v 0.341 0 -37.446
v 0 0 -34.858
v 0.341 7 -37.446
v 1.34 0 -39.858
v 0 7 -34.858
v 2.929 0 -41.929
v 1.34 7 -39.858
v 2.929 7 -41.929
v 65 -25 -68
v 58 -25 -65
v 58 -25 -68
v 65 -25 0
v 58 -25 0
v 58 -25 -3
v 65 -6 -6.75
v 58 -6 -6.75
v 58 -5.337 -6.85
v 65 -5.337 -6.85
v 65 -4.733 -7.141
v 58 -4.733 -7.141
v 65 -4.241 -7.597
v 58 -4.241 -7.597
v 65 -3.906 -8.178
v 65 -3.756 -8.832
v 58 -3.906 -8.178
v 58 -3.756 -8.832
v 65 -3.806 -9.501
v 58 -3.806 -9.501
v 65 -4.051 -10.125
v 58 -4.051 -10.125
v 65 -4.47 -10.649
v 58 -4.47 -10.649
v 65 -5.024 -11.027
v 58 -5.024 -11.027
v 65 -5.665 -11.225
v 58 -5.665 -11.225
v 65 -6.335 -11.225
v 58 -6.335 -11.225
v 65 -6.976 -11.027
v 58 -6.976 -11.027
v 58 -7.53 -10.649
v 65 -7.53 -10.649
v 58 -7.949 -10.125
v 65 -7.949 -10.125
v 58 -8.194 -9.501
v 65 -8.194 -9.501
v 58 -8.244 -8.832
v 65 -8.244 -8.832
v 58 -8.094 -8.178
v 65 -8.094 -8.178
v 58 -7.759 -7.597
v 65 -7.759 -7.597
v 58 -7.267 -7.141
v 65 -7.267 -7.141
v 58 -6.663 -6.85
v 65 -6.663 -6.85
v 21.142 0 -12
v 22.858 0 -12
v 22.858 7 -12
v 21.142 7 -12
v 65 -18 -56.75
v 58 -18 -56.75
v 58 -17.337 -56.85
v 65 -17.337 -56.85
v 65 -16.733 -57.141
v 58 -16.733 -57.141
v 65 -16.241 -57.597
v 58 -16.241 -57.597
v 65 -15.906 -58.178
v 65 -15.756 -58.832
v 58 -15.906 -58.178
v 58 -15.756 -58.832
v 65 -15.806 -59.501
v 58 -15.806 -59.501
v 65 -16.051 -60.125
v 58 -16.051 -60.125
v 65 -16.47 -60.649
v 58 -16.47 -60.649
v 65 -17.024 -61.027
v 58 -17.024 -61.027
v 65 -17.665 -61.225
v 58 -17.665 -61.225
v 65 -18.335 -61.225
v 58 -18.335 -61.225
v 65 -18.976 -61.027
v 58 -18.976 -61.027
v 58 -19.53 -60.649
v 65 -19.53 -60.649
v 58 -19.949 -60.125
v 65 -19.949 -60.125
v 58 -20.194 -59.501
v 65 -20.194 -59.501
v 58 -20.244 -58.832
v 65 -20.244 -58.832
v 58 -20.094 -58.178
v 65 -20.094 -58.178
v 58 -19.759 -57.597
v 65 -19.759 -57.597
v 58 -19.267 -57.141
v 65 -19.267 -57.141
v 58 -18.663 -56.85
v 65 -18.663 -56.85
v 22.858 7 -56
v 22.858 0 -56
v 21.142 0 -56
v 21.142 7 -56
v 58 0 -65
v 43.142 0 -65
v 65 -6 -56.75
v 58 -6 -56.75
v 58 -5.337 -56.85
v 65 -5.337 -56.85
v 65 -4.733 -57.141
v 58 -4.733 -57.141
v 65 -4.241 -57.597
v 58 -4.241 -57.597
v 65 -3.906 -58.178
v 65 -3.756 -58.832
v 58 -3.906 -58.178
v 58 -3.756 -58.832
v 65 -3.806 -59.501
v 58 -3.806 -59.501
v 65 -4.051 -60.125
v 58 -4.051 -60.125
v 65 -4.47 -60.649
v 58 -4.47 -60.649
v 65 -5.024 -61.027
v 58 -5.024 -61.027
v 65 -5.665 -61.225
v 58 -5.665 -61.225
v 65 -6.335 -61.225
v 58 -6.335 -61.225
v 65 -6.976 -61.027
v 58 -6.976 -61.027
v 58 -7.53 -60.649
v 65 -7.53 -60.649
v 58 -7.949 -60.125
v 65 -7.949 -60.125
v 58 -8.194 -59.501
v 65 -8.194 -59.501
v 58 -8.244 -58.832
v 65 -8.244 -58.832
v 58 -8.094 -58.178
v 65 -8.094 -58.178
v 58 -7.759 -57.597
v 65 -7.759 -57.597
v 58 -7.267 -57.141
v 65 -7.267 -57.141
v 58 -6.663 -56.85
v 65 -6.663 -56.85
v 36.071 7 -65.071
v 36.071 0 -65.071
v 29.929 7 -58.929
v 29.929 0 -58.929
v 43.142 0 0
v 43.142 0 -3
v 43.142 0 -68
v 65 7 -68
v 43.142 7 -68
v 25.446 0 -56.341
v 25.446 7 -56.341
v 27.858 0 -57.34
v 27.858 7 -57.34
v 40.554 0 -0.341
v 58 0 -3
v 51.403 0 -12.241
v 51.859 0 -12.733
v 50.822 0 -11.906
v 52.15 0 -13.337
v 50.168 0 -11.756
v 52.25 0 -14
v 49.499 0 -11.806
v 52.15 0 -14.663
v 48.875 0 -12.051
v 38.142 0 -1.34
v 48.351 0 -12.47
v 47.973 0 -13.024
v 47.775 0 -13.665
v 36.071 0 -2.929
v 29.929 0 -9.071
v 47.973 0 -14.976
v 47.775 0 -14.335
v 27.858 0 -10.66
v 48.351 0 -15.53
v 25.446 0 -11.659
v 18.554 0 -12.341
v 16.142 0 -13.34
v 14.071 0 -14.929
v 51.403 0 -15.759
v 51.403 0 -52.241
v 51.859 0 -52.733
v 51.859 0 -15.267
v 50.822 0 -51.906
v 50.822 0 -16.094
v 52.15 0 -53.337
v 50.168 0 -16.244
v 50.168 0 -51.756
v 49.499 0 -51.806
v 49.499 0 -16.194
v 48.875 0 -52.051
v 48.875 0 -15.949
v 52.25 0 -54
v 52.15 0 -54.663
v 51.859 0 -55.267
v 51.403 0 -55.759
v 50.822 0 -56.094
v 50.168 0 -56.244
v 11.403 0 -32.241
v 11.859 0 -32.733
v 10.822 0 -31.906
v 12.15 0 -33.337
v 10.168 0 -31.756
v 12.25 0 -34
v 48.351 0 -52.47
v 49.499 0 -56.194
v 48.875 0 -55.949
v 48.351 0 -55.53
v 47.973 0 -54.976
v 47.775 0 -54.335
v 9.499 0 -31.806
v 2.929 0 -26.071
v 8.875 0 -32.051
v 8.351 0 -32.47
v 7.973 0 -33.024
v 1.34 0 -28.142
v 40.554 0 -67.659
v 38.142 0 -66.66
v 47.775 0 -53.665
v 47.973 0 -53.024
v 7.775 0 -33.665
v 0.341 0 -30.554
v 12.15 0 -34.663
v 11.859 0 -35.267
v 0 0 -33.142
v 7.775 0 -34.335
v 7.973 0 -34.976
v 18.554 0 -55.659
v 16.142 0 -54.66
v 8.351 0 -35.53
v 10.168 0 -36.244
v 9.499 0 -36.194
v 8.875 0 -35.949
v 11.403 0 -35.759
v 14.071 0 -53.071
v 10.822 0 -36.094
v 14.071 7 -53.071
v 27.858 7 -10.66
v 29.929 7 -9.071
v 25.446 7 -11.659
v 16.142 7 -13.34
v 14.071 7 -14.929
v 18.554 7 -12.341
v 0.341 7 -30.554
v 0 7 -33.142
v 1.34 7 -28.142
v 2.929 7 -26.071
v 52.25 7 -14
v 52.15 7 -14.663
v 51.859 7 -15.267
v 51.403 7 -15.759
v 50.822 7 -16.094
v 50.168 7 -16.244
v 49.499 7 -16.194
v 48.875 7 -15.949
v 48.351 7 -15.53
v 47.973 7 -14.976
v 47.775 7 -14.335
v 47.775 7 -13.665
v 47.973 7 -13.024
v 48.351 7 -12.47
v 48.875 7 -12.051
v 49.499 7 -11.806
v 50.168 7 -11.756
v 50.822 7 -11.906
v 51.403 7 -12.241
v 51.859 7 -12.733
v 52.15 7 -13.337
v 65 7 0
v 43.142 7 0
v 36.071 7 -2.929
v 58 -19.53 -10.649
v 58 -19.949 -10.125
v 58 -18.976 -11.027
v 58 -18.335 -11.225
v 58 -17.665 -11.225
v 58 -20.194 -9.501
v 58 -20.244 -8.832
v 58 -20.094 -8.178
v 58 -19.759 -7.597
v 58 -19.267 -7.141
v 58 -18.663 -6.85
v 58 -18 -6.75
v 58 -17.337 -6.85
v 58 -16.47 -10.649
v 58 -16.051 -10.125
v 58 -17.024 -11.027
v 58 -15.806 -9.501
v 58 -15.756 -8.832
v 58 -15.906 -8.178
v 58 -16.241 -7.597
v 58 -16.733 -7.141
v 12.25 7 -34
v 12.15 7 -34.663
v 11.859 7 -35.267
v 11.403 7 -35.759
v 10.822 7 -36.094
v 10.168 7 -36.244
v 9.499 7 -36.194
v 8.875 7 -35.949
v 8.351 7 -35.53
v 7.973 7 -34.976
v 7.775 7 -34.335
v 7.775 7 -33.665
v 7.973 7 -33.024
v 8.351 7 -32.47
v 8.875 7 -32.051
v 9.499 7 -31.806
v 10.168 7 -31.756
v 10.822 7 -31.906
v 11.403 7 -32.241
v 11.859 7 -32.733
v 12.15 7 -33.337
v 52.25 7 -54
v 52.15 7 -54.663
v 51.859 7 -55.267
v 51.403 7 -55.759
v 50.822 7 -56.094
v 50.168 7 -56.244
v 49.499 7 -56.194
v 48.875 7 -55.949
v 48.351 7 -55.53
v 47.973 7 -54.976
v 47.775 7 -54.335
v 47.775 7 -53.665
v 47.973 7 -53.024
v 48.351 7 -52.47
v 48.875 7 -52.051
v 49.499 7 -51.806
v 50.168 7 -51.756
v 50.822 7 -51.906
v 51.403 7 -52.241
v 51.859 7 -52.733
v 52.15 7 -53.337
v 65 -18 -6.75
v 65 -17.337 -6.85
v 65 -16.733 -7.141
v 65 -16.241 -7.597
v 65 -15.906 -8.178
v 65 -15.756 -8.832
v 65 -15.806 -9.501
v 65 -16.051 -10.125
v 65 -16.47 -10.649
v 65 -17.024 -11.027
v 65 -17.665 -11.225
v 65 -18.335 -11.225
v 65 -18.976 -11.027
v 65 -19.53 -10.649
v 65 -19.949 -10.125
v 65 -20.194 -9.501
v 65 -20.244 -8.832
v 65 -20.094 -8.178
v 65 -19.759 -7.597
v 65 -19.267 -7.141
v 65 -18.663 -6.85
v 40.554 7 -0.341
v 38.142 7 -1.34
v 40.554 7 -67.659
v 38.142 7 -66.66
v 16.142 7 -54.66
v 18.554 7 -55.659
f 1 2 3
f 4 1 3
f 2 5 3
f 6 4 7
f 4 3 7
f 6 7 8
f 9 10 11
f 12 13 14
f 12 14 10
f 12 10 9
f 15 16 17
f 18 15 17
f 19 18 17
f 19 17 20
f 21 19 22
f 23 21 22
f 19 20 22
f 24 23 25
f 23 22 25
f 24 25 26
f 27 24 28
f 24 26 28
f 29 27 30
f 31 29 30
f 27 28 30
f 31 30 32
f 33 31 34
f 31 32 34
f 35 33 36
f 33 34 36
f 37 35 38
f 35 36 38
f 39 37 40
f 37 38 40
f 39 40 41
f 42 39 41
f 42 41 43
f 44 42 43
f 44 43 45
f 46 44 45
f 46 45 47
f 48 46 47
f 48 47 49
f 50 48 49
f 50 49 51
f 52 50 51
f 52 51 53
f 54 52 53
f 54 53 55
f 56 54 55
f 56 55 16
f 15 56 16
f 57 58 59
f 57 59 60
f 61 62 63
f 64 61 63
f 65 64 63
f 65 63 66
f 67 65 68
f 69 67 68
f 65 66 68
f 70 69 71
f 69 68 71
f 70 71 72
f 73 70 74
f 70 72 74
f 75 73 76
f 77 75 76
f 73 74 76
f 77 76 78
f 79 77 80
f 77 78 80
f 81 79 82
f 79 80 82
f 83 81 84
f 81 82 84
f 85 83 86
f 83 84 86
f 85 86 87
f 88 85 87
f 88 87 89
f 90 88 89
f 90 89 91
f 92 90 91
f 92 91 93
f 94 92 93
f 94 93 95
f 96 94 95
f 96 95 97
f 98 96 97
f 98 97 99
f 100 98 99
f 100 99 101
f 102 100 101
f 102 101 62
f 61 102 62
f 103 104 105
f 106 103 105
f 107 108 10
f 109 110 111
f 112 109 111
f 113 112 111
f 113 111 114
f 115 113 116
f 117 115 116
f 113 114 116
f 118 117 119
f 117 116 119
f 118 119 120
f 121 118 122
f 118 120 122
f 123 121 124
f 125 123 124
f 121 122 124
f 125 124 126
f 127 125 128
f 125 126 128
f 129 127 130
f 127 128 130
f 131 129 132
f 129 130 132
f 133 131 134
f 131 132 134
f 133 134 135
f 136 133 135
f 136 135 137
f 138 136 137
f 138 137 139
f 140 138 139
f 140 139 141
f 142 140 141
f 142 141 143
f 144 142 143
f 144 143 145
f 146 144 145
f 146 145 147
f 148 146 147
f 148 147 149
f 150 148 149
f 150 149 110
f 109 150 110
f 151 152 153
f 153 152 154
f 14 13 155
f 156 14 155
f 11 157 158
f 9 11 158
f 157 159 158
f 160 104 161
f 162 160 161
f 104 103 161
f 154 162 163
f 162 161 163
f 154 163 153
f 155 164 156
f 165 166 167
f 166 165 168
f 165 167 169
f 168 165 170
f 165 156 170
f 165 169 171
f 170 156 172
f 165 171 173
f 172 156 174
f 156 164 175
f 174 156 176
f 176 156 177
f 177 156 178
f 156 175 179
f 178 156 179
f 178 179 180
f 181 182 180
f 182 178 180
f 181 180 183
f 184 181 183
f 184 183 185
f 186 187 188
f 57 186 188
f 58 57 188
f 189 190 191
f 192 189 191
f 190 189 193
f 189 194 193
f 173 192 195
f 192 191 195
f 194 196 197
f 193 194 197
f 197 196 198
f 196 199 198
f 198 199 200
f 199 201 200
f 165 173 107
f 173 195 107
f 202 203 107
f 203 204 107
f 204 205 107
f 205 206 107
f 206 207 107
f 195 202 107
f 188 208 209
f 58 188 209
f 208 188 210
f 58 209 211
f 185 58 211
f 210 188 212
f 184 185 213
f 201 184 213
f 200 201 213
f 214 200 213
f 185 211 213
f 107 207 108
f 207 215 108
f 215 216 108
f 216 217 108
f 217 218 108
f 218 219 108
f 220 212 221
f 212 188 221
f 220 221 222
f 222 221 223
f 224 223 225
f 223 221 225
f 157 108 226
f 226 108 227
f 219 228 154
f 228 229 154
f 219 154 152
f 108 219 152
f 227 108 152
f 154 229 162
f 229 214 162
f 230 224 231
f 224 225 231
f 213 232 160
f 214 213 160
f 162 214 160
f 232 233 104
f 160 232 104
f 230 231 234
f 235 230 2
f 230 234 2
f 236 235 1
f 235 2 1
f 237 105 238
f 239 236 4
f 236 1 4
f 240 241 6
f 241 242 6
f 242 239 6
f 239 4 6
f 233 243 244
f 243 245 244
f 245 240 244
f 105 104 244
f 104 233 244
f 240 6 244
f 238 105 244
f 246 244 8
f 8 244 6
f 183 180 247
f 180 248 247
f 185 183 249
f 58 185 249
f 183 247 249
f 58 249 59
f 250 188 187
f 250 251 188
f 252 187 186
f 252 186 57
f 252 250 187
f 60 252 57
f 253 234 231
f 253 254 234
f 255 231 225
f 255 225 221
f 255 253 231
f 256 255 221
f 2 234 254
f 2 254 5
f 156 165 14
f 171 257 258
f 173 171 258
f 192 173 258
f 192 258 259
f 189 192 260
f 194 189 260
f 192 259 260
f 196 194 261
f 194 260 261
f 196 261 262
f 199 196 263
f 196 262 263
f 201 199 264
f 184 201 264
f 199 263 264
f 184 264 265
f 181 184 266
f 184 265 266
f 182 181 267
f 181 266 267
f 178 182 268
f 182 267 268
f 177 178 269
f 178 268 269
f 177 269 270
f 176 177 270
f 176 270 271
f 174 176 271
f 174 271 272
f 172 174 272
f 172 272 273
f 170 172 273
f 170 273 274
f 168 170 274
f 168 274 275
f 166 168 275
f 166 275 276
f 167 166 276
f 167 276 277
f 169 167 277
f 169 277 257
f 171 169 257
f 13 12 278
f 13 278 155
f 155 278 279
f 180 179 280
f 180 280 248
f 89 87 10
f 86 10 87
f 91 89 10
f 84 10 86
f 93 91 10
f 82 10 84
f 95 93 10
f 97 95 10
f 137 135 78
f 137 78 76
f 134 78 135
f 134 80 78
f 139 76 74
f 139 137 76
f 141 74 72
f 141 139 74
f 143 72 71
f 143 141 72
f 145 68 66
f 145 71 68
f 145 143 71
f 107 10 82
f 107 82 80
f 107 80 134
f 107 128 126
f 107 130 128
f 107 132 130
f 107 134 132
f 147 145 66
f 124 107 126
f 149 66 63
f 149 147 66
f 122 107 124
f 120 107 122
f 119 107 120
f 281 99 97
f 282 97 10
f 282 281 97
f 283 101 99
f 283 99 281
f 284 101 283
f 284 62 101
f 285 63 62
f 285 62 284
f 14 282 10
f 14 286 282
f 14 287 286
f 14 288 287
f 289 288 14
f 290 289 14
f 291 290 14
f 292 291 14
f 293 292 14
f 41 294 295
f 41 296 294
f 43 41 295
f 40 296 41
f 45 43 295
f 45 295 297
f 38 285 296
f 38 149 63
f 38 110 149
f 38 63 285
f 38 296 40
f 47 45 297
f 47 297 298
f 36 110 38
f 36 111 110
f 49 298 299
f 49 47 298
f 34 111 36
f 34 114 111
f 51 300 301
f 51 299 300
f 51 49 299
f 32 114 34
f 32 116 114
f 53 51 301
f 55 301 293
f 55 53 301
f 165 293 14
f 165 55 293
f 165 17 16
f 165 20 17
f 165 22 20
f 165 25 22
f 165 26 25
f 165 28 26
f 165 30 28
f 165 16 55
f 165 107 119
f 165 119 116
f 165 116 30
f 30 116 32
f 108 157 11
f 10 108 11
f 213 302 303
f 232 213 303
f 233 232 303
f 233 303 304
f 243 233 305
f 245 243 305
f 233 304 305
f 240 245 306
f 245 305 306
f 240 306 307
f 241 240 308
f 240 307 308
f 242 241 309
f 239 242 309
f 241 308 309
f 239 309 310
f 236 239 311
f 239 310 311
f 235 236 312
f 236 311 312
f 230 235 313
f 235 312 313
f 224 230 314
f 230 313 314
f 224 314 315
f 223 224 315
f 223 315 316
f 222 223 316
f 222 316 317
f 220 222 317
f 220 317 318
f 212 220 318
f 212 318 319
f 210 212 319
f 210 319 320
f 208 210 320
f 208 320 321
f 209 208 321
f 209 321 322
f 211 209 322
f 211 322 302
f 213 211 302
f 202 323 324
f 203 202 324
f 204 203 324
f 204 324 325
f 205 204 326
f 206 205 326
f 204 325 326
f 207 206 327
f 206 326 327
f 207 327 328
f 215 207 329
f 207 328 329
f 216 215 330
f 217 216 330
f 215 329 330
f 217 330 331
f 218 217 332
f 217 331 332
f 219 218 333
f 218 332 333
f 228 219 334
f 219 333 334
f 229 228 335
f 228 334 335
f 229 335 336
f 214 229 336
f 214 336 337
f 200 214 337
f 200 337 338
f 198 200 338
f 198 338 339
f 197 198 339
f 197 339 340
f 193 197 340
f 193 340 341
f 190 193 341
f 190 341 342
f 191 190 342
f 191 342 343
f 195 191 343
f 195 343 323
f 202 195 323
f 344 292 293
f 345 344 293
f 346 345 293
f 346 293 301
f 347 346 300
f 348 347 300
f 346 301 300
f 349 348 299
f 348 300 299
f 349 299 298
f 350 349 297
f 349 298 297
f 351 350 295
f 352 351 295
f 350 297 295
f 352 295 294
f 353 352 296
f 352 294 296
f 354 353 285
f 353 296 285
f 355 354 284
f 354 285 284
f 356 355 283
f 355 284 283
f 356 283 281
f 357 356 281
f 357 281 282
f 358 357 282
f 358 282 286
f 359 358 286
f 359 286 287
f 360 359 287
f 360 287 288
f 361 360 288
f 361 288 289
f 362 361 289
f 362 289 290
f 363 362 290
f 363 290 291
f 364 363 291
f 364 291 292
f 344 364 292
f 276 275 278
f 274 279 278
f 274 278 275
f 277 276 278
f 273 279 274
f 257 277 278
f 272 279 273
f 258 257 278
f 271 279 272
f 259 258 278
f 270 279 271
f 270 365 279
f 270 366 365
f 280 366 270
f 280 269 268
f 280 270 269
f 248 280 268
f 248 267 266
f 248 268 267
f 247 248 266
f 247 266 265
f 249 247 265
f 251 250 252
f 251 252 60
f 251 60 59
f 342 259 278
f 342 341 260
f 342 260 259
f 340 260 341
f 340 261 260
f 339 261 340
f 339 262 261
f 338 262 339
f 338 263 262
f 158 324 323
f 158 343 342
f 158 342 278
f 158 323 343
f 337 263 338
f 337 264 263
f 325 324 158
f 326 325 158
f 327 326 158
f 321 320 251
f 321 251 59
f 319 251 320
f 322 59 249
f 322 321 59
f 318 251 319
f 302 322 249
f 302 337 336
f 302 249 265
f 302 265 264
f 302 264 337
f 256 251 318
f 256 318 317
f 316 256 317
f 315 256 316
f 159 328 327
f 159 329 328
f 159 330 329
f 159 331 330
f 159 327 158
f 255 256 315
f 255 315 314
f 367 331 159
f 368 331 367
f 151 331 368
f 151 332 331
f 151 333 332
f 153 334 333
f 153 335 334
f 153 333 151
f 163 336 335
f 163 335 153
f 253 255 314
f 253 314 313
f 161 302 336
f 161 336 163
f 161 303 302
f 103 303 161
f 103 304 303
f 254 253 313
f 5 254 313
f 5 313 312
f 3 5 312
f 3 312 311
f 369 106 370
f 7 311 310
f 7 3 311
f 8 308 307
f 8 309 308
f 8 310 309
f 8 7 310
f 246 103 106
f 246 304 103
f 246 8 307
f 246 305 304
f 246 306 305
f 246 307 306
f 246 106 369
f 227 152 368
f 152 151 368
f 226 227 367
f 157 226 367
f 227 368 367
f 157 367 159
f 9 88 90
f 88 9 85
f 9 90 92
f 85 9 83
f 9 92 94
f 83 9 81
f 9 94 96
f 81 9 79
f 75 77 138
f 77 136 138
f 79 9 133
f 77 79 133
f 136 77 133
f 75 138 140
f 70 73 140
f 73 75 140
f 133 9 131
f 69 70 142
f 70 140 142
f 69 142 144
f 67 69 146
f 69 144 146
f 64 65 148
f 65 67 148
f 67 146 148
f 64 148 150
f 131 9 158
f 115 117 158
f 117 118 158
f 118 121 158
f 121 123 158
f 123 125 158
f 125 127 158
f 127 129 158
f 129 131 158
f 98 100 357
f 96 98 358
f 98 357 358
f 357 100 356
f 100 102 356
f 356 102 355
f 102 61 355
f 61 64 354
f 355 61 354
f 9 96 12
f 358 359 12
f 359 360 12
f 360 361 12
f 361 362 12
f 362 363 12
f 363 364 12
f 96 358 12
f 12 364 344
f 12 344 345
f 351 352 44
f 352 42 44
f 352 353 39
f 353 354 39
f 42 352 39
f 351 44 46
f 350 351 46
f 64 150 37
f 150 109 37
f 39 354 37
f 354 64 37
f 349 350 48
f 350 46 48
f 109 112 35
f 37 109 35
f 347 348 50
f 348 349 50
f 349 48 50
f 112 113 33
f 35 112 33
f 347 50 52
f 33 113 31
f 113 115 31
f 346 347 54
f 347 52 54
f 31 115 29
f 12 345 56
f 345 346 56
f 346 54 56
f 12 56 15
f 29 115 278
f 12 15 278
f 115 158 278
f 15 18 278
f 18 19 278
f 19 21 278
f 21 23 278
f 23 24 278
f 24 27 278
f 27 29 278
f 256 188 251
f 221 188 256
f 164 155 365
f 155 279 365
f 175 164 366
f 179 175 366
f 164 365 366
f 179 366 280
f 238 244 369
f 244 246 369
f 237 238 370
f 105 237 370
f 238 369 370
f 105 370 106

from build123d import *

# Parameters (mm, degrees)
SKETCH1_W            = 60
SKETCH1_H            = 68
BOSS_EXTRUDE1_DEPTH  = 7
M4_CLEARANCE_HOLE4_D = 4.5
CUT_EXTRUDE5_DEPTH   = 91.956033335
FILLET3_R            = 10
SKETCH30_W           = 68
SKETCH30_H           = 7
BOSS_EXTRUDE8_DEPTH  = 5
SKETCH31_W           = 7
SKETCH31_H           = 68
BOSS_EXTRUDE9_DEPTH  = 25
M4_CLEARANCE_HOLE5_D = 4.5
BOSS_EXTRUDE12_DEPTH = 3
BOSS_EXTRUDE13_DEPTH = 3


with BuildPart() as part:
    # Sketch1 → Boss-Extrude1 (new body)
    with BuildSketch(Plane(origin=(0, 0, 0), x_dir=(1, 0, 0), z_dir=(0, 1, 0))):
        with Locations((30, 34)):
            Rectangle(SKETCH1_W, SKETCH1_H)
    extrude(amount=BOSS_EXTRUDE1_DEPTH)

    # M4 Clearance Hole4 (through all)
    with Locations(Plane(origin=(0, 0, 0), x_dir=(-1, 0, 0), z_dir=(0, -1, 0))):
        with Locations((-50, 54), (-50, 14), (-10, 34)):
            Hole(M4_CLEARANCE_HOLE4_D / 2)

    # Sketch29 → Cut-Extrude5 (cut, through all)
    with BuildSketch(Plane.XZ):
        Polygon((39, 0), (27, -12), (17, -12), (0, -29), (0, 0), align=None)
        Polygon((0, -39), (0, -68), (39, -68), (27, -56), (17, -56), align=None)
    extrude(amount=-CUT_EXTRUDE5_DEPTH, mode=Mode.SUBTRACT)

    # Fillet3
    fillet3_edges = [part.edges().sort_by_distance(p)[0] for p in [
        (39, 3.5, 0),
        (27, 3.5, -12),
        (17, 3.5, -12),
        (0, 3.5, -29),
        (0, 3.5, -39),
        (17, 3.5, -56),
        (27, 3.5, -56),
        (39, 3.5, -68),
    ]]
    fillet(fillet3_edges, radius=FILLET3_R)

    # Sketch30 → Boss-Extrude8 (add)
    with BuildSketch(Plane(origin=(60, 0, 0), x_dir=(0, 0, -1), z_dir=(1, 0, 0))):
        with Locations((34, 3.5)):
            Rectangle(SKETCH30_W, SKETCH30_H)
    extrude(amount=BOSS_EXTRUDE8_DEPTH)

    # Sketch31 → Boss-Extrude9 (add)
    with BuildSketch(Plane.XZ):
        with Locations((61.5, -34)):
            Rectangle(SKETCH31_W, SKETCH31_H)
    extrude(amount=BOSS_EXTRUDE9_DEPTH)

    # M4 Clearance Hole5 (through all)
    with Locations(Plane(origin=(65, 0, 0), x_dir=(0, 0, -1), z_dir=(1, 0, 0))):
        with Locations((59, -6), (59, -18), (9, -6), (9, -18)):
            Hole(M4_CLEARANCE_HOLE5_D / 2)

    # Sketch36 → Boss-Extrude12 (add)
    with BuildSketch(Plane.XY):
        Polygon((58, -25), (43.142135624, 0), (58, 0), align=None)
    extrude(amount=-BOSS_EXTRUDE12_DEPTH)

    # Sketch37 → Boss-Extrude13 (add)
    with BuildSketch(Plane(origin=(0, 0, -68), x_dir=(-1, 0, 0), z_dir=(0, 0, -1))):
        Polygon((-43.142135624, 0), (-58, -25), (-58, 0), align=None)
    extrude(amount=-BOSS_EXTRUDE13_DEPTH)


solid = part.part
